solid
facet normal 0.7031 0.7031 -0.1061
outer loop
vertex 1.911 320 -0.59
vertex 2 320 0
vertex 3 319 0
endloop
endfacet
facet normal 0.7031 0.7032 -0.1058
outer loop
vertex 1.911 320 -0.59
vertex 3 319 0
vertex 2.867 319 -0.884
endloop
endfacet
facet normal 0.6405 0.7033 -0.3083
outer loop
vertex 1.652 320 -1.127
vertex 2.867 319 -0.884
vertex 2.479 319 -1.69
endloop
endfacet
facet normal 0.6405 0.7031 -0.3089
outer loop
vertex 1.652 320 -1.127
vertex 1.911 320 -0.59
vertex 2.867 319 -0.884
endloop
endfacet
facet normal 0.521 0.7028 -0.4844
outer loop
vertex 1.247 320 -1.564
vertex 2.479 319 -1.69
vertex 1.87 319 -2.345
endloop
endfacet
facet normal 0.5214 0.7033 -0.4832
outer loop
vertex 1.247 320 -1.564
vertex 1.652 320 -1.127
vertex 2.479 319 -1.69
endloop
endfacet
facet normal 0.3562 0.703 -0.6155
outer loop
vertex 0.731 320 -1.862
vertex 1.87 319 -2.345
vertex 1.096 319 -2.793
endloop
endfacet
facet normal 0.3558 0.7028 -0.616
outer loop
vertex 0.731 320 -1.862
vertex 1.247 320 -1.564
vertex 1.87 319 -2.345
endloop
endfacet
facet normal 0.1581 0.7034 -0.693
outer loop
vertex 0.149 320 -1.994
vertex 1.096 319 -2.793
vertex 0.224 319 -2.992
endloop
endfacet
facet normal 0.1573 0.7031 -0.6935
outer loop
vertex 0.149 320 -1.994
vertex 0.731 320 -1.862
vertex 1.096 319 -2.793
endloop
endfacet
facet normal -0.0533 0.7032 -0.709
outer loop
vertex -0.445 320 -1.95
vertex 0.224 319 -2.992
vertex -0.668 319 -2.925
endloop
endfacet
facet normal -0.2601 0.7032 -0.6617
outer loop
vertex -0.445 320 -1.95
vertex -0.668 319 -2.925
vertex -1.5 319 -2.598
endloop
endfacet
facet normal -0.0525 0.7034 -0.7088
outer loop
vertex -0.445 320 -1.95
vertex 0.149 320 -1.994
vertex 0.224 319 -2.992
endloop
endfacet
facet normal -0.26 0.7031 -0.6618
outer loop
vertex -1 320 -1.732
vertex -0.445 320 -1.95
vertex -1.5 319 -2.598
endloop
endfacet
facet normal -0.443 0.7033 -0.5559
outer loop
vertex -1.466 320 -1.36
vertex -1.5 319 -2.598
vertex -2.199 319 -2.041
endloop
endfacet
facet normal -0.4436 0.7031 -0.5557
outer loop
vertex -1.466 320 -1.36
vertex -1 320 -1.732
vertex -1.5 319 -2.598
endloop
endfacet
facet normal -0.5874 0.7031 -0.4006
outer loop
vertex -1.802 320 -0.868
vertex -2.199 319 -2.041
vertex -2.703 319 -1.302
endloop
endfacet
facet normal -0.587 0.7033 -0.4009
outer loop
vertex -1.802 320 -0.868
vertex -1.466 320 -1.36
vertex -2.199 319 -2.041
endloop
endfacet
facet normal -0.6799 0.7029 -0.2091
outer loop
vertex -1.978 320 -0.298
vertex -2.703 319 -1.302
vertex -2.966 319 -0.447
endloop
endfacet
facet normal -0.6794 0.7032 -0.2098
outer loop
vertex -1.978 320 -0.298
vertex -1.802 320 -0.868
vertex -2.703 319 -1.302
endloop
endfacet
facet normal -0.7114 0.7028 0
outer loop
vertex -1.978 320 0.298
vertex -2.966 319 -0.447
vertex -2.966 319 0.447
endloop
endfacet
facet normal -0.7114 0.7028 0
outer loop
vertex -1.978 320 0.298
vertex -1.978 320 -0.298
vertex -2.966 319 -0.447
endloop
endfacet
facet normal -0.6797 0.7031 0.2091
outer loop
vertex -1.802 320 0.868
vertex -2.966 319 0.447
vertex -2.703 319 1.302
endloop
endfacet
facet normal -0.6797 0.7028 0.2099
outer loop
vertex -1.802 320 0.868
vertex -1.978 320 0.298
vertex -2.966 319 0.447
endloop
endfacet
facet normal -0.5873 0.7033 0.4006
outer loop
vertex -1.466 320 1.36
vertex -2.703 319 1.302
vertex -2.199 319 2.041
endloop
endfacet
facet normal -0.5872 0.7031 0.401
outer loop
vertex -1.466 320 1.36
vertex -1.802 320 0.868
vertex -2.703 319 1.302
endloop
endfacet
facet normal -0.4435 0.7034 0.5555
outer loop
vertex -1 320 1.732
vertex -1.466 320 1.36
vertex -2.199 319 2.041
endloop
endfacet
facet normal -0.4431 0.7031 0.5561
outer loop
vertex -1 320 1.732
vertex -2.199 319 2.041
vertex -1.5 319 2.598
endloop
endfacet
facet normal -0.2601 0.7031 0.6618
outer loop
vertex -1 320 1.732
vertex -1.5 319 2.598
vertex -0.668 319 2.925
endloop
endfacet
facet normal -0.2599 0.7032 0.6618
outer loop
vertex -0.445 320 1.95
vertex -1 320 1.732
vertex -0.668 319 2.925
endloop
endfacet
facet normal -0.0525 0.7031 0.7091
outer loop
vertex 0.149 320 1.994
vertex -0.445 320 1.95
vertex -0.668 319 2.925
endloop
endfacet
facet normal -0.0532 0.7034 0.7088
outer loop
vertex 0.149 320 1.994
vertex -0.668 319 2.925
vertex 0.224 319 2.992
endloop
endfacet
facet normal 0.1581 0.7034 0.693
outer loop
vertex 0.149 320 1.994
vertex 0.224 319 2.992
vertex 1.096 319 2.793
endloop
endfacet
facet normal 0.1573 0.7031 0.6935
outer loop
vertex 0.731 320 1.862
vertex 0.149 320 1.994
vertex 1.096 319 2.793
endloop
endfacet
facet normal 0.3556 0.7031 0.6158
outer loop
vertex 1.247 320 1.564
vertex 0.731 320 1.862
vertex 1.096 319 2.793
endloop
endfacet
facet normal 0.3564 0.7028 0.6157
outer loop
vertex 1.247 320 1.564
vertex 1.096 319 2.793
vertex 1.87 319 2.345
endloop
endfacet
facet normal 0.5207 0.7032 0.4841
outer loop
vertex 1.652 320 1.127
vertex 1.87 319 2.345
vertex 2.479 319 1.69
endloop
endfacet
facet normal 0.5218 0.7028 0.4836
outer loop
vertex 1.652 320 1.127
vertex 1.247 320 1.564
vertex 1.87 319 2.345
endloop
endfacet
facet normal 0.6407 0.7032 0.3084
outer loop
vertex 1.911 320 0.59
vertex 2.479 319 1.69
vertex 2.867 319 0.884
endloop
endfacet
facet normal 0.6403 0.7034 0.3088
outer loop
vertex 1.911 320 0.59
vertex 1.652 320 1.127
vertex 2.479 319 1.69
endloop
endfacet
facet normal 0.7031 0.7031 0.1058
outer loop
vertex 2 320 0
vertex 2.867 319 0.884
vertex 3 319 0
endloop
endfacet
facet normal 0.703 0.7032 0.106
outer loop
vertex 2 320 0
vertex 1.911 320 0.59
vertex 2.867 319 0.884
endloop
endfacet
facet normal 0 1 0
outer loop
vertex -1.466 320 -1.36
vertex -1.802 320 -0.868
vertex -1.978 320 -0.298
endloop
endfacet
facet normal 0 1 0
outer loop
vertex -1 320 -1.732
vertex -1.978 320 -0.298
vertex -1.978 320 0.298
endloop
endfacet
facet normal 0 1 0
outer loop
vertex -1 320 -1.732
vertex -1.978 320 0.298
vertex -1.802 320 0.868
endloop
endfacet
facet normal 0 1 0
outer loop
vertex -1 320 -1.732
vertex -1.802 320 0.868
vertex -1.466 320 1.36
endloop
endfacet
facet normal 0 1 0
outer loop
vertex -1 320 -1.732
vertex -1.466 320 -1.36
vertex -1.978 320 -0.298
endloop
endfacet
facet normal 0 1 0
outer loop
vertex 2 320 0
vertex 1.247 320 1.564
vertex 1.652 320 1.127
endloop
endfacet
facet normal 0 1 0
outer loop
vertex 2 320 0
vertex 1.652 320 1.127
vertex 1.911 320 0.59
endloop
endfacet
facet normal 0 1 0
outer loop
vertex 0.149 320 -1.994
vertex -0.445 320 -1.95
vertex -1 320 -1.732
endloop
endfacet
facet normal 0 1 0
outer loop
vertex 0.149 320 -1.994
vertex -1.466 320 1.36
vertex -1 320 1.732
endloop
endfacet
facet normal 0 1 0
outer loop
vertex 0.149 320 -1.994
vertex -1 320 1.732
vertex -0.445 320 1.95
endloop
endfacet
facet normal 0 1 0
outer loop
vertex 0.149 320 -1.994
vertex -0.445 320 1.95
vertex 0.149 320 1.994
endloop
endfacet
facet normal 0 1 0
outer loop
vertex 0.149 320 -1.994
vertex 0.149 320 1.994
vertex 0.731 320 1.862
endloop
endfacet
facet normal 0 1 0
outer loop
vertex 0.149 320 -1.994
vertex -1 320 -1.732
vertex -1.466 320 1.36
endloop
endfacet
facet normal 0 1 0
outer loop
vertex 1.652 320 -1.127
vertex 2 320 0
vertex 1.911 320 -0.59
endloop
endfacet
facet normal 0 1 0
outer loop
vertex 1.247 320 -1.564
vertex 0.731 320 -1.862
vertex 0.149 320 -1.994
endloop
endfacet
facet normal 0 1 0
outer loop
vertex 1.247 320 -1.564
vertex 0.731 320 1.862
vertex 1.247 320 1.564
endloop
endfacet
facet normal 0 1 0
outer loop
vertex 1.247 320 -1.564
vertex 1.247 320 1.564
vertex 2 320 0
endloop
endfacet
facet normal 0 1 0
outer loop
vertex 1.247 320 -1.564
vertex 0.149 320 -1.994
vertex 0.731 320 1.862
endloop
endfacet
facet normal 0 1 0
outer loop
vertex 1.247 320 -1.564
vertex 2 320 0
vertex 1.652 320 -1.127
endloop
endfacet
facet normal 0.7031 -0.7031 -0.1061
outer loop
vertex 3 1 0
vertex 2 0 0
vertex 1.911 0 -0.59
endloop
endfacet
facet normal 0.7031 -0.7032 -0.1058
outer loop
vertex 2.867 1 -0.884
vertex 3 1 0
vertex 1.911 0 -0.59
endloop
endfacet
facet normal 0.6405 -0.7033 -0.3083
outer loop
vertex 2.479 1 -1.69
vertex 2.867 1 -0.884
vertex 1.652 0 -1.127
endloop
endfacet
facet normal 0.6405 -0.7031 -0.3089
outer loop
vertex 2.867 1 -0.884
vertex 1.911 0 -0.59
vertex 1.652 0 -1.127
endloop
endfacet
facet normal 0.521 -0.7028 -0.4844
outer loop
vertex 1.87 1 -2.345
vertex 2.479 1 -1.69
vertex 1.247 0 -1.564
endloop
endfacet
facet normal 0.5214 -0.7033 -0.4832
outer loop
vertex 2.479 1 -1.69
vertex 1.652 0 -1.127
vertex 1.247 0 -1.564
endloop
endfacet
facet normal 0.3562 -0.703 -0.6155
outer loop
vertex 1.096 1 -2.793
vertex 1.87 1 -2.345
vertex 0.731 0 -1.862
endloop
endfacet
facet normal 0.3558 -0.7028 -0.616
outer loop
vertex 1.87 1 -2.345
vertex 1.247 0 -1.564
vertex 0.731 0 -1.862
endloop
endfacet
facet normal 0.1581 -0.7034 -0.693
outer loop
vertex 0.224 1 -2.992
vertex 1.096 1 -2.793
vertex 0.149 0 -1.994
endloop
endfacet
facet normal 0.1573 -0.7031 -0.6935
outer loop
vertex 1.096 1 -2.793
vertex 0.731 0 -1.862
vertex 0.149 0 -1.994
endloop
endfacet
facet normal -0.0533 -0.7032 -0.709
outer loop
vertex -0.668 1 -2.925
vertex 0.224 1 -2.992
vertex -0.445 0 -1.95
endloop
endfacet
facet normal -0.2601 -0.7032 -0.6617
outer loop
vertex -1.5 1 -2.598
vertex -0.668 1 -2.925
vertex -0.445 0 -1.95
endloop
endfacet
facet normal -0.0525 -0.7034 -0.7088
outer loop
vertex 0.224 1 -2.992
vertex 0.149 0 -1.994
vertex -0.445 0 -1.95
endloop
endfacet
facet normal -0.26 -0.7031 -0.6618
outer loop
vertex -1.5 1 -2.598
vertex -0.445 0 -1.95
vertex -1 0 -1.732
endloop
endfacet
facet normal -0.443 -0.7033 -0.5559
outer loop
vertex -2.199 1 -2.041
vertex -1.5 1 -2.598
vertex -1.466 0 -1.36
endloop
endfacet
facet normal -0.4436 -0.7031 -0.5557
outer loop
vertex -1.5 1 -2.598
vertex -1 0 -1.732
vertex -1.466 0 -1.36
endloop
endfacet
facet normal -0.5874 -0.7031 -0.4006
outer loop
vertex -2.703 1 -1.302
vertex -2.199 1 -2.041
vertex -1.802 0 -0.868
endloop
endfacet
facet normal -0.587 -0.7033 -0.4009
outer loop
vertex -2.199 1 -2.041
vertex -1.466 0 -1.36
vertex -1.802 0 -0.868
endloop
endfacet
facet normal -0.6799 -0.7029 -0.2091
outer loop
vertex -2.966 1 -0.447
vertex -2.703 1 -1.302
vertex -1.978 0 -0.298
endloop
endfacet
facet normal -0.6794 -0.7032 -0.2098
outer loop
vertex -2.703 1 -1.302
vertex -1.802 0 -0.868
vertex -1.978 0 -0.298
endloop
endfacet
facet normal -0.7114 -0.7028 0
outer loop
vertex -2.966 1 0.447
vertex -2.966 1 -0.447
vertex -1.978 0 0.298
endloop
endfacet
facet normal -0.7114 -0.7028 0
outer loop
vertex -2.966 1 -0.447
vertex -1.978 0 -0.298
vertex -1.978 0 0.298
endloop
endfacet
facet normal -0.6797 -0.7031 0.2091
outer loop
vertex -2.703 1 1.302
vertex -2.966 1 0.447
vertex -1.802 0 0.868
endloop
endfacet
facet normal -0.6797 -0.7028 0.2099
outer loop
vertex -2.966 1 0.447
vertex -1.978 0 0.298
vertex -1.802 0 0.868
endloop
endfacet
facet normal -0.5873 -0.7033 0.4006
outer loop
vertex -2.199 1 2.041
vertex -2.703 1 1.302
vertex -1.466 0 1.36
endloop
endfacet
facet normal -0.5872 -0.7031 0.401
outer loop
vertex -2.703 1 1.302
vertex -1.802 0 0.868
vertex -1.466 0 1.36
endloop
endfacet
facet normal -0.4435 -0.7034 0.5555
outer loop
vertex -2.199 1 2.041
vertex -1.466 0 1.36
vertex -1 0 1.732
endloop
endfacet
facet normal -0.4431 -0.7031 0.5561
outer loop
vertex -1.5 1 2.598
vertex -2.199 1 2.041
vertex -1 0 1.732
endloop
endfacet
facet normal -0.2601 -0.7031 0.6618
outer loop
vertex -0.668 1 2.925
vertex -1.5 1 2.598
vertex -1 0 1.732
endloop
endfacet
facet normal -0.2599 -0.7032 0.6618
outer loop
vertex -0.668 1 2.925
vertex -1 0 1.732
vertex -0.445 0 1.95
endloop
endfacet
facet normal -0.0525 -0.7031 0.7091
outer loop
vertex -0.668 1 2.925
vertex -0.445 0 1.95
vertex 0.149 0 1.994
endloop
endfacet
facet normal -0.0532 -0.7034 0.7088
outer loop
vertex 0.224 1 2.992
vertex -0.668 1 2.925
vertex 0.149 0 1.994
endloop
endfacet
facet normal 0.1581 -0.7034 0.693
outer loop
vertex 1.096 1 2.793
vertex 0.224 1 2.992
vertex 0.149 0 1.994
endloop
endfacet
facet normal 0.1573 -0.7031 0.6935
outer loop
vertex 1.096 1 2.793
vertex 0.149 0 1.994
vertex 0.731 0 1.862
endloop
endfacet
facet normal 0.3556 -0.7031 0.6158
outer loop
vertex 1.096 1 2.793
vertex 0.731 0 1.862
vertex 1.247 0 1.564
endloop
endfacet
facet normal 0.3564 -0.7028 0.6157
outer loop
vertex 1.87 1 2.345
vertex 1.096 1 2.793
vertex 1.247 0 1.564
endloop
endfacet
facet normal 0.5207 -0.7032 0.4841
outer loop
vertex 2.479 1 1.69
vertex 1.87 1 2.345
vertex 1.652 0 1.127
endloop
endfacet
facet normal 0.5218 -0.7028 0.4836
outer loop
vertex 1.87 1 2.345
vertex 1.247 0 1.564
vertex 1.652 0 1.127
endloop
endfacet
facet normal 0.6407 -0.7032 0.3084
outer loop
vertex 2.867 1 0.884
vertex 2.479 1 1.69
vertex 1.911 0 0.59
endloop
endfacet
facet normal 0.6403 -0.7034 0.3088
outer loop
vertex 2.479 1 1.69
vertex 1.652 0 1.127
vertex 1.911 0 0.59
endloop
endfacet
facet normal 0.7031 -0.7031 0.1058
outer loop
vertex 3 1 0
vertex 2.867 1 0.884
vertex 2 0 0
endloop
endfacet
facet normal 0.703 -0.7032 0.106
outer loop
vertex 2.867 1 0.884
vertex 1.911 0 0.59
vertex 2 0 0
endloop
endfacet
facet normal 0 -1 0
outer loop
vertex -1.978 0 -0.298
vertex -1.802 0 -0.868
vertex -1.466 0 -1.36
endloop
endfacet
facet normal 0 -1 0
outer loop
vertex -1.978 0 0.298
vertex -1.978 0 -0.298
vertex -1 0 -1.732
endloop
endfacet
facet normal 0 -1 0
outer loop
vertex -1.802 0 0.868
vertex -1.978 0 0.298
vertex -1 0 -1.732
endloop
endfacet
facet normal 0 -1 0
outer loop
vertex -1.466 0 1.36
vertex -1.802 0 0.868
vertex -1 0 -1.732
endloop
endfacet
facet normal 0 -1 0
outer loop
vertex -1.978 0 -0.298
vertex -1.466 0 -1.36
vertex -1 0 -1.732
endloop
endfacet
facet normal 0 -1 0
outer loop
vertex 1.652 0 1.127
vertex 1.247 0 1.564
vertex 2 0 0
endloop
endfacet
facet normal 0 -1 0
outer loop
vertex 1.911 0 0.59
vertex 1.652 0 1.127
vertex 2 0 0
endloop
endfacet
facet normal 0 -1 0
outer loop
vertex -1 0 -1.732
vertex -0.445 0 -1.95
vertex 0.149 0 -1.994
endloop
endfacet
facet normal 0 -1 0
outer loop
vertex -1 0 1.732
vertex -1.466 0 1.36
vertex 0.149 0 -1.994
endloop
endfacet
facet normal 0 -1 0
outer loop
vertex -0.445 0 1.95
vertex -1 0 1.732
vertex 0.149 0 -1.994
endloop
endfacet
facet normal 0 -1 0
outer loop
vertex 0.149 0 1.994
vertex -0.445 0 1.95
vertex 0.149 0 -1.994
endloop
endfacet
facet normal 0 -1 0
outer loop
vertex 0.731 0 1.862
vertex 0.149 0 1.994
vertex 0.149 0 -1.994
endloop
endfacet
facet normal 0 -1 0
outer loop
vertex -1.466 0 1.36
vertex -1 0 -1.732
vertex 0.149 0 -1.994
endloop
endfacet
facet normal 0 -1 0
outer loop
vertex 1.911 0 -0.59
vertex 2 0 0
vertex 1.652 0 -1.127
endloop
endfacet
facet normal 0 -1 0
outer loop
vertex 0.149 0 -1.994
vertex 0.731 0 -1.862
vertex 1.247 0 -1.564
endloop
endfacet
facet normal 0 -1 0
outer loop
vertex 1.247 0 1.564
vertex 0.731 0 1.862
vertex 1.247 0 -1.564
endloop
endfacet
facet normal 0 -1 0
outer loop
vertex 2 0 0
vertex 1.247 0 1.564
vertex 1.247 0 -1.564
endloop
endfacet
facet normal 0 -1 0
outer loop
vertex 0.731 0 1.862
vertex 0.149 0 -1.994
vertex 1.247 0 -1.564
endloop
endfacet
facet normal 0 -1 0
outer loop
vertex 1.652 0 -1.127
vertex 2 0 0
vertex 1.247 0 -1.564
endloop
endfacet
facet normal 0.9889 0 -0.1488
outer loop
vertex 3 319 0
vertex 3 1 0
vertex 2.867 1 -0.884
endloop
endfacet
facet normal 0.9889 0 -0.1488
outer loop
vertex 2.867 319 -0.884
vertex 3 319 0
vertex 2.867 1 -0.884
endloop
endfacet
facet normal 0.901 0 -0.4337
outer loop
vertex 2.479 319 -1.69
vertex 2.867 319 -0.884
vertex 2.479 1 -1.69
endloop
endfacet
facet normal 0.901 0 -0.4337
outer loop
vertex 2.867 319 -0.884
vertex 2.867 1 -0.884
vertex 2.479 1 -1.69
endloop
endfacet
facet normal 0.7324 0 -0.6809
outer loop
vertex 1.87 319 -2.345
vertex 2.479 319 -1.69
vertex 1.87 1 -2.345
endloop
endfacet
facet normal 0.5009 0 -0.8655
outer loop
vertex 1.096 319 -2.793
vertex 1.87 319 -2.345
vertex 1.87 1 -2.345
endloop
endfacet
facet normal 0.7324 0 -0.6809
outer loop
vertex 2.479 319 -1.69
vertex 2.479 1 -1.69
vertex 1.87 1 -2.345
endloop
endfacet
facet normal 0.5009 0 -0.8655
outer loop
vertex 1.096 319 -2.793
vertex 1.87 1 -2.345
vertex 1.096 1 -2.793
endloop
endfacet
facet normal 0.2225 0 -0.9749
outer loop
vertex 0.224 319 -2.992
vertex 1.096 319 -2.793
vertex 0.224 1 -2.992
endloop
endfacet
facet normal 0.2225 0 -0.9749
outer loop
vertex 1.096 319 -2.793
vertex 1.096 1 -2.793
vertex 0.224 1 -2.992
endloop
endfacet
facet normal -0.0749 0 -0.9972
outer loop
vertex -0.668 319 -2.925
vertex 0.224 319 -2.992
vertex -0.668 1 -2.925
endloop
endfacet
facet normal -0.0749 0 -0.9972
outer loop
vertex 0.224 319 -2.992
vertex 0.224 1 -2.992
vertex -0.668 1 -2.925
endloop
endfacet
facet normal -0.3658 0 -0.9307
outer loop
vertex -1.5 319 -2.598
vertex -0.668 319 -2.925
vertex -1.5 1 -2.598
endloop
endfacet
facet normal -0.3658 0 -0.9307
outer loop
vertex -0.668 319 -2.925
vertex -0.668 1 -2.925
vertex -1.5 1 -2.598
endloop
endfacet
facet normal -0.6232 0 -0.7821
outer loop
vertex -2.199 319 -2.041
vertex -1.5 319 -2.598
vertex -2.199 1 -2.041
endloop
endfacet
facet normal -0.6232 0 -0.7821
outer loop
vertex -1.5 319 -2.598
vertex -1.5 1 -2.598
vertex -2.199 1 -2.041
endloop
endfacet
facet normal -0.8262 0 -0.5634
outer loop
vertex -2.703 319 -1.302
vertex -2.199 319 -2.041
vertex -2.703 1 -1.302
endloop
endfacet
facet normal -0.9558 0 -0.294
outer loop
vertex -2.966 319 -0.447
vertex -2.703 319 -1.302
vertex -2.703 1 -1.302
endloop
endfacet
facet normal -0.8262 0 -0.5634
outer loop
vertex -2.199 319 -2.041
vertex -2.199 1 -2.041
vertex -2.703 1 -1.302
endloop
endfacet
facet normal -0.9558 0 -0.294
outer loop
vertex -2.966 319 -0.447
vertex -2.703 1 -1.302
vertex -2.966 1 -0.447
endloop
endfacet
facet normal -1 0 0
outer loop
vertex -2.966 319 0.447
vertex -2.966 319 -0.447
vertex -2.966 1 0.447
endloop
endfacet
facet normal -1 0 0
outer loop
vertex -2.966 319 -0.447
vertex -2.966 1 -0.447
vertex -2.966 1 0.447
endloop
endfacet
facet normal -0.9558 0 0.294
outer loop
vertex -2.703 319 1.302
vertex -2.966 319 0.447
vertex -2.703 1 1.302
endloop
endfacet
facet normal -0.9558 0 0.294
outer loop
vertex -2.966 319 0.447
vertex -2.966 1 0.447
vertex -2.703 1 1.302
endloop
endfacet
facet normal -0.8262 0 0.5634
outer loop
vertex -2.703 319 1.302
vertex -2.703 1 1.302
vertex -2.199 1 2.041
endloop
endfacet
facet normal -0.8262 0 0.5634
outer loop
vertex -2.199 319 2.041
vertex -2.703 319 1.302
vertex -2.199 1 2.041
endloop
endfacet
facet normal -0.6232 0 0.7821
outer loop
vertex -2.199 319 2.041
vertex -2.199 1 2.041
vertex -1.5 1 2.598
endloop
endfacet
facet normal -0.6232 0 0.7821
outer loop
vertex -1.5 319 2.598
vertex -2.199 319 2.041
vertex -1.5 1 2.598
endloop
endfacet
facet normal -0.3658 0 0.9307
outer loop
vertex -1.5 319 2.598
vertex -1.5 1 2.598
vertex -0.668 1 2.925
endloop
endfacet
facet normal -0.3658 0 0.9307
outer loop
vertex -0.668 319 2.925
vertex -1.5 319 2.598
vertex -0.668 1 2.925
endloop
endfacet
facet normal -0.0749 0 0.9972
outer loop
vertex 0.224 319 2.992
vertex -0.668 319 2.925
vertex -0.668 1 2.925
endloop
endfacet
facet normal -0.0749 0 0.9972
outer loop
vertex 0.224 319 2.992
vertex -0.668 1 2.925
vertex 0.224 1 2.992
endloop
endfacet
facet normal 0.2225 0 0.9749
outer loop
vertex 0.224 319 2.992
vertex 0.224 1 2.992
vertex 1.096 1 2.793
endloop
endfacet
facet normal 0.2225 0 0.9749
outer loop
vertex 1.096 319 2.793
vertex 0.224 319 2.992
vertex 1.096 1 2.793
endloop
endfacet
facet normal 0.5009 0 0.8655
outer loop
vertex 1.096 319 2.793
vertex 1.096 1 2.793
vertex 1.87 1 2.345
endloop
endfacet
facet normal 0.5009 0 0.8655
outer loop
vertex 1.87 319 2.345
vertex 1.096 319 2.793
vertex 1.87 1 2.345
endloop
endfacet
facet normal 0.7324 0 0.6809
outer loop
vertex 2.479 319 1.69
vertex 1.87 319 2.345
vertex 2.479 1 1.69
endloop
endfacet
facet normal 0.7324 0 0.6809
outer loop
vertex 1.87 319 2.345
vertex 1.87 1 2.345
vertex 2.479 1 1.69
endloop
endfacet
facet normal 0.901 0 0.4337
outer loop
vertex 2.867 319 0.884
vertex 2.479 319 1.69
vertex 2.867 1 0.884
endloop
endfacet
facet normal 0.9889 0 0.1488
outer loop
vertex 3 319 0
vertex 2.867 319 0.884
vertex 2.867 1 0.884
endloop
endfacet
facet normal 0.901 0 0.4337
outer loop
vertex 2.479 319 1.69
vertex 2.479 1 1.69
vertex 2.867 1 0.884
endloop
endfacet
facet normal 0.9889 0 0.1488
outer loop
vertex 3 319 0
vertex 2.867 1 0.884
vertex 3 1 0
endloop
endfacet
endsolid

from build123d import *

# Parameters (mm, degrees)
SKETCH_1_R      = 3
EXTRUDE_1_DEPTH = 320
CHAMFER_1_SIZE  = 1
CHAMFER_2_SIZE  = 1


with BuildPart() as part:
    # Эскиз1 → Бобышка-Вытянуть1 (new body)
    with BuildSketch(Plane(origin=(0, 0, 0), x_dir=(1, 0, 0), z_dir=(0, 1, 0))):
        Circle(SKETCH_1_R)
    extrude(amount=EXTRUDE_1_DEPTH)

    # Фаска1
    chamfer_1_edges = [part.edges().sort_by_distance(p)[0] for p in [
        (-3, 320, 0),
    ]]
    chamfer(chamfer_1_edges, length=CHAMFER_1_SIZE)

    # Фаска2
    chamfer_2_edges = [part.edges().sort_by_distance(p)[0] for p in [
        (-3, 0, 0),
    ]]
    chamfer(chamfer_2_edges, length=CHAMFER_2_SIZE)


solid = part.part
